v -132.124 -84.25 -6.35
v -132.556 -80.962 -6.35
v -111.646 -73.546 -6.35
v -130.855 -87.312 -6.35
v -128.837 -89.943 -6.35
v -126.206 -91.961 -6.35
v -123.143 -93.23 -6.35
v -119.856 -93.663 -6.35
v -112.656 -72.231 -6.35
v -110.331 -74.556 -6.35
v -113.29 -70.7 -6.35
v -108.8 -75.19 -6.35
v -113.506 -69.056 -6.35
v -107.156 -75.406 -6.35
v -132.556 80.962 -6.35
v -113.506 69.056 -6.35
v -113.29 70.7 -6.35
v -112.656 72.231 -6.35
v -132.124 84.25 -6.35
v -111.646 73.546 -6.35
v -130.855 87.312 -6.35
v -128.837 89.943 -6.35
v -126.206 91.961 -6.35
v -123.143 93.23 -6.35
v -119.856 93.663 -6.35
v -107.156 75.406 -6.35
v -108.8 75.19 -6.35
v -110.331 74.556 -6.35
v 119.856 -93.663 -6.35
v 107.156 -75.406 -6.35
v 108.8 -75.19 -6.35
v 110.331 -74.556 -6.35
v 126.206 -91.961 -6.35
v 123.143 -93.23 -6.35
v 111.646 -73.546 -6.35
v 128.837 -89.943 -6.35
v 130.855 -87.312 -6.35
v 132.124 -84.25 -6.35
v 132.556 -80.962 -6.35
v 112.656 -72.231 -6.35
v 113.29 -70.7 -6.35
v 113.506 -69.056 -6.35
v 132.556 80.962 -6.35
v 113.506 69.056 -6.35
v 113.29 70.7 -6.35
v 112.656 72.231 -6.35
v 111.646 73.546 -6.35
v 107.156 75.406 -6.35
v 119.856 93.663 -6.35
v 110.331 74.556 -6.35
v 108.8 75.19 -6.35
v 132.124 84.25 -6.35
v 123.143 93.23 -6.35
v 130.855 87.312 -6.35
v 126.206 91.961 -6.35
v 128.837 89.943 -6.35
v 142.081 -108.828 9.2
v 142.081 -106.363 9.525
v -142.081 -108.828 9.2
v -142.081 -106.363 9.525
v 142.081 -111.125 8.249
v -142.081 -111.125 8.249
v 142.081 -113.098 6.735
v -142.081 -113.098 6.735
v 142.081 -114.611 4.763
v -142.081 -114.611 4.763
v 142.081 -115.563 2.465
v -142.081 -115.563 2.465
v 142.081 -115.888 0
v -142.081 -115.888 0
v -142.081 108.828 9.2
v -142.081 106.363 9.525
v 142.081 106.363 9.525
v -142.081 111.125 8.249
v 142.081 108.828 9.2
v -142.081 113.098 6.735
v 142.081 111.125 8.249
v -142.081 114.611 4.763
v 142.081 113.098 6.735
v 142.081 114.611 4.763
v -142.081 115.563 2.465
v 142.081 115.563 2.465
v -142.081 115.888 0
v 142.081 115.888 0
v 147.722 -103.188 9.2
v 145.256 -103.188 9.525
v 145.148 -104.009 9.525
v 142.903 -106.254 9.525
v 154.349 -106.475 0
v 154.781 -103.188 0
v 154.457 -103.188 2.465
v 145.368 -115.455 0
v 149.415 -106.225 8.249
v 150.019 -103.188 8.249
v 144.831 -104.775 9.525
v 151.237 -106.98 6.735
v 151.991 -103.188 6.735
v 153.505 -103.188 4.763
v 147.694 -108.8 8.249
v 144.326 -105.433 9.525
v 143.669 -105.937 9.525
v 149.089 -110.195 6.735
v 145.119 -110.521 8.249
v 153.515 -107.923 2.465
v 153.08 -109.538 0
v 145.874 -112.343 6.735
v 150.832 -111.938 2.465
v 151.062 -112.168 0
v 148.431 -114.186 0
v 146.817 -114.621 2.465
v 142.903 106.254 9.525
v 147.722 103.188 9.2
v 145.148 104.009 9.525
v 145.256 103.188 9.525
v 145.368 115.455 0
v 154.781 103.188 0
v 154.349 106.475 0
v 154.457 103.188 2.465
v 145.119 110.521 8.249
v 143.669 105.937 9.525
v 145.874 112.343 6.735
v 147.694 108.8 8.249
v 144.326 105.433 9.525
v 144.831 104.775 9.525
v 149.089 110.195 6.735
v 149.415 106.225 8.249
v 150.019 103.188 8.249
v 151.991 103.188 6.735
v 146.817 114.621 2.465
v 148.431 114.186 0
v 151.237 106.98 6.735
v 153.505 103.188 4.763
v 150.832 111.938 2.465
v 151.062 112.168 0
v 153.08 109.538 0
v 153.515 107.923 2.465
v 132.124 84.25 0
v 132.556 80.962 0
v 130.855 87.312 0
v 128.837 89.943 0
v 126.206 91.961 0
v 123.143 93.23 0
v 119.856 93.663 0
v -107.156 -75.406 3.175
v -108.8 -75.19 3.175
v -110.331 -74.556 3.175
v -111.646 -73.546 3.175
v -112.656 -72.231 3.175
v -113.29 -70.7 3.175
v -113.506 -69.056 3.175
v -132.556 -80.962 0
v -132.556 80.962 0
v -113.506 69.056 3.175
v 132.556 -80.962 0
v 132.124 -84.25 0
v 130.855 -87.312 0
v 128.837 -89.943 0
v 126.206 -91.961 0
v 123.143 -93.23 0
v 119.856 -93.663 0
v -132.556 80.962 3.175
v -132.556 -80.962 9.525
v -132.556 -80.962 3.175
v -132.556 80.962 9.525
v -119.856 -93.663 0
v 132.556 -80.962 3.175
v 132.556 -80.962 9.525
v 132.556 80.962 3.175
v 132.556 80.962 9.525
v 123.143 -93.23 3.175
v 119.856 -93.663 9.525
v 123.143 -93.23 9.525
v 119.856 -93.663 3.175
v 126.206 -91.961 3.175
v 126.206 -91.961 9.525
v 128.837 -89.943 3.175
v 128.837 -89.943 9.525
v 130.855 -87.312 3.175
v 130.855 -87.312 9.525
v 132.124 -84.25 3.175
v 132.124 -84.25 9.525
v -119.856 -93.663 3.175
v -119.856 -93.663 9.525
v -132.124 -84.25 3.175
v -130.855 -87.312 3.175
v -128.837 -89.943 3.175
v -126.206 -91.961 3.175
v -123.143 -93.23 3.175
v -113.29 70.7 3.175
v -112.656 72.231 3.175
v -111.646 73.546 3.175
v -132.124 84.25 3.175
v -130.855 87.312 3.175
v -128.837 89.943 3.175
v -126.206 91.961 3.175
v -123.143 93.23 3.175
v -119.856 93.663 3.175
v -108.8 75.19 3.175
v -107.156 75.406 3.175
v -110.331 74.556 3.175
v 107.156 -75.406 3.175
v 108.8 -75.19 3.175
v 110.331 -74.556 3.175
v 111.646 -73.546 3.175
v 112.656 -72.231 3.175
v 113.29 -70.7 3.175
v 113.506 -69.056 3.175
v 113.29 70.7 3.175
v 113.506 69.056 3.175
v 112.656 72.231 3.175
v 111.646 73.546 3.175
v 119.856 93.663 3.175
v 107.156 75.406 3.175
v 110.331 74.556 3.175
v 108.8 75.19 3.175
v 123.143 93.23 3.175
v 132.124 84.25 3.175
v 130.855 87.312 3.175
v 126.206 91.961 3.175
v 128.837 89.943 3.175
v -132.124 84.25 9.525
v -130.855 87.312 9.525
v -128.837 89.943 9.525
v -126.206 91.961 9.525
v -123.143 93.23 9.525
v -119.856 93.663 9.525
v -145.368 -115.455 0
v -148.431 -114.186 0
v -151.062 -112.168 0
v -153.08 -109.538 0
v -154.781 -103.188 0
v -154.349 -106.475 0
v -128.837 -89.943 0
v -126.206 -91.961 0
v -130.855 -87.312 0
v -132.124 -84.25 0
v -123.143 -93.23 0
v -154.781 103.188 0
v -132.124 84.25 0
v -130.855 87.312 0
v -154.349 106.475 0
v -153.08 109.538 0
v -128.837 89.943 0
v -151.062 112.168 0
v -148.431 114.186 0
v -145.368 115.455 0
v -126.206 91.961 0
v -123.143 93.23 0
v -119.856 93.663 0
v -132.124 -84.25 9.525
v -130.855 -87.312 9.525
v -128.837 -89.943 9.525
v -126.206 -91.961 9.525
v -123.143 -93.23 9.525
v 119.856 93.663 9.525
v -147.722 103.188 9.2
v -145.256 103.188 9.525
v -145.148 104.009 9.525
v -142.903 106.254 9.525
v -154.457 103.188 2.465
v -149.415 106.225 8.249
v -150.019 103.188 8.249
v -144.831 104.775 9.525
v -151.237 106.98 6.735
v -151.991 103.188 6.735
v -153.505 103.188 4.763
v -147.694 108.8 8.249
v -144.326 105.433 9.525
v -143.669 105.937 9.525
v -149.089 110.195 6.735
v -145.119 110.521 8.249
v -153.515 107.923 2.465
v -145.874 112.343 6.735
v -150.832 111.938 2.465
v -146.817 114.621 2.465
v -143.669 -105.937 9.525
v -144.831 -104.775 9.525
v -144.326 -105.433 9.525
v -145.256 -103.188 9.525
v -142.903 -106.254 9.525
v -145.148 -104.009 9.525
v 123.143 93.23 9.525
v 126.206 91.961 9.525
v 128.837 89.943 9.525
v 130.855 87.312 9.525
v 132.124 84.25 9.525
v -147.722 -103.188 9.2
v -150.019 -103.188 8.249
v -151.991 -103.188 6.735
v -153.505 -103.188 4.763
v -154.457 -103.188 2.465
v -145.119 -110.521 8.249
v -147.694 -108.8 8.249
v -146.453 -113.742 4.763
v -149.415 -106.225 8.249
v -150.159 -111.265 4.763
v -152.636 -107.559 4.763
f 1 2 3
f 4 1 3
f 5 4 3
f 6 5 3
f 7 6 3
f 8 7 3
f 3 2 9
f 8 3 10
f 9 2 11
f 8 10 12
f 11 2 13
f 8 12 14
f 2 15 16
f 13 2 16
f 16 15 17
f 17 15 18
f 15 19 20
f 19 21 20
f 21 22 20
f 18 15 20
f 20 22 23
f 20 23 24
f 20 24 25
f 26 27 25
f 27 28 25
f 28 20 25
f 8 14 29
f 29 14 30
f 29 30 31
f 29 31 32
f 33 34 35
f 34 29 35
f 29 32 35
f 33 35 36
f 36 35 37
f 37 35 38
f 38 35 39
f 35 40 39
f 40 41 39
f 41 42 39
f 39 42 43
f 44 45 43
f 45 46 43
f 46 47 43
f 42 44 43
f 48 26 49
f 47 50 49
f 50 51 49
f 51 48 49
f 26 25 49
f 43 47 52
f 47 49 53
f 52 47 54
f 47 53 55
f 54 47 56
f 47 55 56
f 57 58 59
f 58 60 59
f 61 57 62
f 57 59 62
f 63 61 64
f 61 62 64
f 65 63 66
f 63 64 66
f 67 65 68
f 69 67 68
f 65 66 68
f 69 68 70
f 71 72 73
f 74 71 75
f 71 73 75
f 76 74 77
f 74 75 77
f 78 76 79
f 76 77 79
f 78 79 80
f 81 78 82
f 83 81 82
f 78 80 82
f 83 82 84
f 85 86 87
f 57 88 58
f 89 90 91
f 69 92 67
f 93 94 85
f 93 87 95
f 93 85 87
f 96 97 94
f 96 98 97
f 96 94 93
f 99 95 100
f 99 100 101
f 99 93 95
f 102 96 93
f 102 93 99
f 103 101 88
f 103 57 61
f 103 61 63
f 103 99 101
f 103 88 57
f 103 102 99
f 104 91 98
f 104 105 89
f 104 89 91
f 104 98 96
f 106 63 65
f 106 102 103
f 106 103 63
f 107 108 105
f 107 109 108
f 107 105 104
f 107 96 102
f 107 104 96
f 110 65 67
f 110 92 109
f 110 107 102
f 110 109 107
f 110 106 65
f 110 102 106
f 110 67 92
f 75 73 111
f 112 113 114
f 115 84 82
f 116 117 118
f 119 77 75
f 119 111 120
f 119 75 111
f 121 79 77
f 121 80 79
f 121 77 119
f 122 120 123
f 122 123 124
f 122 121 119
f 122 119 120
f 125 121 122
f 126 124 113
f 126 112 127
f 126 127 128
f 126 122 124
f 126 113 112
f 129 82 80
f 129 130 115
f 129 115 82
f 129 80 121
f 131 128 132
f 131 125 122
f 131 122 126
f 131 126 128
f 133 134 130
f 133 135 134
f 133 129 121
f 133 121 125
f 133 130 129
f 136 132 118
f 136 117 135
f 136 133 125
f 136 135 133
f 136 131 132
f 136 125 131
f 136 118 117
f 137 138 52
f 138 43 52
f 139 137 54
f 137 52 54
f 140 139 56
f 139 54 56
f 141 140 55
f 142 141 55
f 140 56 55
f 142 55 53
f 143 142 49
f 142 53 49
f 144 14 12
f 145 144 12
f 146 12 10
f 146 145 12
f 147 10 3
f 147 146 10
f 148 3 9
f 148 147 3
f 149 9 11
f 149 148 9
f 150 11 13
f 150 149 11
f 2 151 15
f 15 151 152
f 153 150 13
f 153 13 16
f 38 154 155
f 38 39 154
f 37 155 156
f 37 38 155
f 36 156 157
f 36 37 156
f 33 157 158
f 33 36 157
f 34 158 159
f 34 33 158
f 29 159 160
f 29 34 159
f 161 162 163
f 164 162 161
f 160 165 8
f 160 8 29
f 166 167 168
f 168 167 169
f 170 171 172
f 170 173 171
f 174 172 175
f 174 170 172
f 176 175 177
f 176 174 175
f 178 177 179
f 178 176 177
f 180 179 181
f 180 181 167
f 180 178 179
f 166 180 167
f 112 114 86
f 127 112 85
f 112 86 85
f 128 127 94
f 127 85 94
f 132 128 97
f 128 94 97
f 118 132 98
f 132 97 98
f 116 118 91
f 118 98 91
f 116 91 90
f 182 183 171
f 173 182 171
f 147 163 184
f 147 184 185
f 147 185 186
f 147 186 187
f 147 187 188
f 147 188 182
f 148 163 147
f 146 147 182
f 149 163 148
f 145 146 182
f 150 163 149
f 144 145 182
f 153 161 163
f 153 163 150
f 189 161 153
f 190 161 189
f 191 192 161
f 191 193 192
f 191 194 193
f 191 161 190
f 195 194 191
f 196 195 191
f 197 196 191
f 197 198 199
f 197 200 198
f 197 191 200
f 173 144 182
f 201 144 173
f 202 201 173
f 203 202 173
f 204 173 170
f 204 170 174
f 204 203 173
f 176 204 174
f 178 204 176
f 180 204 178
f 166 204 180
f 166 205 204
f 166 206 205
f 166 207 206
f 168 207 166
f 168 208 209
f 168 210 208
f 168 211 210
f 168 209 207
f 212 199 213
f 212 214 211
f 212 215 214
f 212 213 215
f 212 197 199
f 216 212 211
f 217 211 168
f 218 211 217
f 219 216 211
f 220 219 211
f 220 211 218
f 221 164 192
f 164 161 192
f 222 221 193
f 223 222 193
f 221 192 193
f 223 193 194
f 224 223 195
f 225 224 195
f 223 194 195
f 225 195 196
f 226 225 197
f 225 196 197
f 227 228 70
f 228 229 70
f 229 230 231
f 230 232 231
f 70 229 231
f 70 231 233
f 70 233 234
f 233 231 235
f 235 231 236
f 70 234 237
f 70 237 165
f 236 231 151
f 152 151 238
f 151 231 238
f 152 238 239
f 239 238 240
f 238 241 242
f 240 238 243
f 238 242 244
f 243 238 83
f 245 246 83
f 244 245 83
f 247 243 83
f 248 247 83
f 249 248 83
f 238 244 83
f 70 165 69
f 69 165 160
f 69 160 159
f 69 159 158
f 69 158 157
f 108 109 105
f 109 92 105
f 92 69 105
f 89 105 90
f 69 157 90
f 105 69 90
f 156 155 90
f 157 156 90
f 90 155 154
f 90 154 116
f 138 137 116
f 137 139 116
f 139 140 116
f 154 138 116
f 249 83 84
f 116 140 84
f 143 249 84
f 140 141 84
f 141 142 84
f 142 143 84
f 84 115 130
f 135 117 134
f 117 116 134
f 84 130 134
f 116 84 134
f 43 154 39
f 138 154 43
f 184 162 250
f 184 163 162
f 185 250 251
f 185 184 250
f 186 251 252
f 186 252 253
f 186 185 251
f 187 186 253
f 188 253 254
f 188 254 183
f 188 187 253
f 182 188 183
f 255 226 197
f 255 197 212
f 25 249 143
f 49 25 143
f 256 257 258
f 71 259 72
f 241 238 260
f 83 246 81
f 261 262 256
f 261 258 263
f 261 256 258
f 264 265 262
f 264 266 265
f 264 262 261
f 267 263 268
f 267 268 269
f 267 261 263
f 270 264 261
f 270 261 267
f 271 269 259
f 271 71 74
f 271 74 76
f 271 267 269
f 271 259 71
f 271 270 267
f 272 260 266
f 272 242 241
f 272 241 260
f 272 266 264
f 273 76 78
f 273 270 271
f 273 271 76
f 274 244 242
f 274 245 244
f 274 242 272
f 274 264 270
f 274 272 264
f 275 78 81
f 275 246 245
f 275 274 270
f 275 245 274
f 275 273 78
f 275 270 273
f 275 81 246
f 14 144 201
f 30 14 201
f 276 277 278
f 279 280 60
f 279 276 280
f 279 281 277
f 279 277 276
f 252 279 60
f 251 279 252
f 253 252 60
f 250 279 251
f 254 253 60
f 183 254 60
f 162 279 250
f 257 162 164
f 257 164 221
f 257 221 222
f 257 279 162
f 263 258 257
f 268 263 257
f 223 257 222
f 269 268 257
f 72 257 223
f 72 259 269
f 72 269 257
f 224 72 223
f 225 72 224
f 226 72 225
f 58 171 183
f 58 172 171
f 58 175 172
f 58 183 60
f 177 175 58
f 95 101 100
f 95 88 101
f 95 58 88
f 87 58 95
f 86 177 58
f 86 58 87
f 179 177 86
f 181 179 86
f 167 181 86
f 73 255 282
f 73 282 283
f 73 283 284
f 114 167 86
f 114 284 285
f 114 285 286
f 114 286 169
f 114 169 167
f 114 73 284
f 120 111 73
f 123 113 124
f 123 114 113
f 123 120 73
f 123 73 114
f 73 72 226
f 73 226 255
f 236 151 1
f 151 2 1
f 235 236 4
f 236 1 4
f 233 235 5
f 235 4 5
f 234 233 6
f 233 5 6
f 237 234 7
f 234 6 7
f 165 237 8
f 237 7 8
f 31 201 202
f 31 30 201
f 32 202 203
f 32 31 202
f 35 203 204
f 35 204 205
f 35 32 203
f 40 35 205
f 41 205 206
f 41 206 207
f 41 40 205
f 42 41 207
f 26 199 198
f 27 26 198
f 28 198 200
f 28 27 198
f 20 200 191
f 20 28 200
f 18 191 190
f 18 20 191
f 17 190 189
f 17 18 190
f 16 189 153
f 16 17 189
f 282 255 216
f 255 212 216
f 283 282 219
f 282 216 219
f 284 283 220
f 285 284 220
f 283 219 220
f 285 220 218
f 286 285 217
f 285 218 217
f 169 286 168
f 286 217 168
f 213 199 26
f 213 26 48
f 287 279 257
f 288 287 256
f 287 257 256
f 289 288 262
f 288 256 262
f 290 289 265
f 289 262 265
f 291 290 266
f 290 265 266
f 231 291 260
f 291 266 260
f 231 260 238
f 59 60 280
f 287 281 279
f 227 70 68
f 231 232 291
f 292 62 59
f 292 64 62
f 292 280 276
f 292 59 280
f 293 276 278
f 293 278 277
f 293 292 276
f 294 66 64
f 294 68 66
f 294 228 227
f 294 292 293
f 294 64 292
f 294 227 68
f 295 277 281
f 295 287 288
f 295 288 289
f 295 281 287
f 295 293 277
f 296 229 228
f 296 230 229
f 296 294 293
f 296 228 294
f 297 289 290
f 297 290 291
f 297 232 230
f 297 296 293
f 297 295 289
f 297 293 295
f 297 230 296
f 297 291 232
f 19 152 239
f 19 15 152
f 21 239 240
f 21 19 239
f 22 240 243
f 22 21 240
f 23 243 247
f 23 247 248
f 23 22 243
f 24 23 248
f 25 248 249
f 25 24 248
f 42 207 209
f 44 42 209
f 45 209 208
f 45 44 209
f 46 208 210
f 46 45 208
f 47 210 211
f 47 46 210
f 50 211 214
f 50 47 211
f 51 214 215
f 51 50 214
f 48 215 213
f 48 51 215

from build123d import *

# Parameters (mm, degrees)
SKETCH1_W           = 309.5625
SKETCH1_H           = 231.775
SKETCH1_W_2         = 265.1125
SKETCH1_H_2         = 187.325
SKETCH1_W_3         = 227.0125
SKETCH1_H_3         = 150.8125
BOSS_EXTRUDE1_DEPTH = 9.525
SKETCH1_3_W         = 265.1125
SKETCH1_3_H         = 187.325
SKETCH1_3_W_2       = 227.0125
SKETCH1_3_H_2       = 150.8125
BOSS_EXTRUDE2_DEPTH = 6.35
FILLET1_R           = 12.7
CUT_EXTRUDE1_START  = 9.525
SKETCH1_4_W         = 265.1125
SKETCH1_4_H         = 187.325
SKETCH1_4_W_2       = 227.0125
SKETCH1_4_H_2       = 150.8125
CUT_EXTRUDE1_DEPTH  = 6.35
FILLET2_R           = 6.35
FILLET3_R           = 12.7
FILLET4_R           = 9.525


with BuildPart() as part:
    # Sketch1 → Boss-Extrude1 (new body)
    # profile 1 of 2: a face of its own
    with BuildSketch(Plane.XY):
        Rectangle(SKETCH1_W, SKETCH1_H)
        Rectangle(SKETCH1_W_2, SKETCH1_H_2, mode=Mode.SUBTRACT)
    # profile 2 of 2: a face of its own
    with BuildSketch(Plane.XY):
        Rectangle(SKETCH1_W_2, SKETCH1_H_2)
        Rectangle(SKETCH1_W_3, SKETCH1_H_3, mode=Mode.SUBTRACT)
    extrude(amount=BOSS_EXTRUDE1_DEPTH)

    # Sketch1<3> → Boss-Extrude2 (add)
    with BuildSketch(Plane.XY):
        Rectangle(SKETCH1_3_W, SKETCH1_3_H)
        Rectangle(SKETCH1_3_W_2, SKETCH1_3_H_2, mode=Mode.SUBTRACT)
    extrude(amount=-BOSS_EXTRUDE2_DEPTH)

    # Fillet1
    fillet1_edges = [part.edges().sort_by_distance(p)[0] for p in [
        (-154.78125, -115.8875, 4.7625),
        (-154.78125, 115.8875, 4.7625),
        (154.78125, 115.8875, 4.7625),
        (154.78125, -115.8875, 4.7625),
        (132.55625, -93.6625, -3.175),
        (-132.55625, -93.6625, -3.175),
        (-132.55625, 93.6625, -3.175),
        (132.55625, 93.6625, -3.175),
    ]]
    fillet(fillet1_edges, radius=FILLET1_R)

    # Sketch1<4> → Cut-Extrude1 (cut)
    with BuildSketch(Plane.XY.offset(CUT_EXTRUDE1_START)):
        Rectangle(SKETCH1_4_W, SKETCH1_4_H)
        Rectangle(SKETCH1_4_W_2, SKETCH1_4_H_2, mode=Mode.SUBTRACT)
    extrude(amount=-CUT_EXTRUDE1_DEPTH, mode=Mode.SUBTRACT)

    # Fillet2
    fillet2_edges = [part.edges().sort_by_distance(p)[0] for p in [
        (-113.50625, 75.40625, -1.5875),
        (113.50625, 75.40625, -1.5875),
        (-113.50625, -75.40625, -1.5875),
        (113.50625, -75.40625, -1.5875),
    ]]
    fillet(fillet2_edges, radius=FILLET2_R)

    # Fillet3
    fillet3_edges = [part.edges().sort_by_distance(p)[0] for p in [
        (-132.55625, -93.6625, 6.35),
        (-132.55625, 93.6625, 6.35),
        (132.55625, 93.6625, 6.35),
        (132.55625, -93.6625, 6.35),
    ]]
    fillet(fillet3_edges, radius=FILLET3_R)

    # Fillet4
    fillet4_edges = [part.edges().sort_by_distance(p)[0] for p in [
        (-151.061506121, -112.167756121, 9.525),
        (0, -115.8875, 9.525),
        (151.061506121, -112.167756121, 9.525),
        (154.78125, 0, 9.525),
        (151.061506121, 112.167756121, 9.525),
        (0, 115.8875, 9.525),
        (-151.061506121, 112.167756121, 9.525),
        (-154.78125, 0, 9.525),
    ]]
    fillet(fillet4_edges, radius=FILLET4_R - 0.0001)  # a hair under: the kernel refuses the full size


solid = part.part
